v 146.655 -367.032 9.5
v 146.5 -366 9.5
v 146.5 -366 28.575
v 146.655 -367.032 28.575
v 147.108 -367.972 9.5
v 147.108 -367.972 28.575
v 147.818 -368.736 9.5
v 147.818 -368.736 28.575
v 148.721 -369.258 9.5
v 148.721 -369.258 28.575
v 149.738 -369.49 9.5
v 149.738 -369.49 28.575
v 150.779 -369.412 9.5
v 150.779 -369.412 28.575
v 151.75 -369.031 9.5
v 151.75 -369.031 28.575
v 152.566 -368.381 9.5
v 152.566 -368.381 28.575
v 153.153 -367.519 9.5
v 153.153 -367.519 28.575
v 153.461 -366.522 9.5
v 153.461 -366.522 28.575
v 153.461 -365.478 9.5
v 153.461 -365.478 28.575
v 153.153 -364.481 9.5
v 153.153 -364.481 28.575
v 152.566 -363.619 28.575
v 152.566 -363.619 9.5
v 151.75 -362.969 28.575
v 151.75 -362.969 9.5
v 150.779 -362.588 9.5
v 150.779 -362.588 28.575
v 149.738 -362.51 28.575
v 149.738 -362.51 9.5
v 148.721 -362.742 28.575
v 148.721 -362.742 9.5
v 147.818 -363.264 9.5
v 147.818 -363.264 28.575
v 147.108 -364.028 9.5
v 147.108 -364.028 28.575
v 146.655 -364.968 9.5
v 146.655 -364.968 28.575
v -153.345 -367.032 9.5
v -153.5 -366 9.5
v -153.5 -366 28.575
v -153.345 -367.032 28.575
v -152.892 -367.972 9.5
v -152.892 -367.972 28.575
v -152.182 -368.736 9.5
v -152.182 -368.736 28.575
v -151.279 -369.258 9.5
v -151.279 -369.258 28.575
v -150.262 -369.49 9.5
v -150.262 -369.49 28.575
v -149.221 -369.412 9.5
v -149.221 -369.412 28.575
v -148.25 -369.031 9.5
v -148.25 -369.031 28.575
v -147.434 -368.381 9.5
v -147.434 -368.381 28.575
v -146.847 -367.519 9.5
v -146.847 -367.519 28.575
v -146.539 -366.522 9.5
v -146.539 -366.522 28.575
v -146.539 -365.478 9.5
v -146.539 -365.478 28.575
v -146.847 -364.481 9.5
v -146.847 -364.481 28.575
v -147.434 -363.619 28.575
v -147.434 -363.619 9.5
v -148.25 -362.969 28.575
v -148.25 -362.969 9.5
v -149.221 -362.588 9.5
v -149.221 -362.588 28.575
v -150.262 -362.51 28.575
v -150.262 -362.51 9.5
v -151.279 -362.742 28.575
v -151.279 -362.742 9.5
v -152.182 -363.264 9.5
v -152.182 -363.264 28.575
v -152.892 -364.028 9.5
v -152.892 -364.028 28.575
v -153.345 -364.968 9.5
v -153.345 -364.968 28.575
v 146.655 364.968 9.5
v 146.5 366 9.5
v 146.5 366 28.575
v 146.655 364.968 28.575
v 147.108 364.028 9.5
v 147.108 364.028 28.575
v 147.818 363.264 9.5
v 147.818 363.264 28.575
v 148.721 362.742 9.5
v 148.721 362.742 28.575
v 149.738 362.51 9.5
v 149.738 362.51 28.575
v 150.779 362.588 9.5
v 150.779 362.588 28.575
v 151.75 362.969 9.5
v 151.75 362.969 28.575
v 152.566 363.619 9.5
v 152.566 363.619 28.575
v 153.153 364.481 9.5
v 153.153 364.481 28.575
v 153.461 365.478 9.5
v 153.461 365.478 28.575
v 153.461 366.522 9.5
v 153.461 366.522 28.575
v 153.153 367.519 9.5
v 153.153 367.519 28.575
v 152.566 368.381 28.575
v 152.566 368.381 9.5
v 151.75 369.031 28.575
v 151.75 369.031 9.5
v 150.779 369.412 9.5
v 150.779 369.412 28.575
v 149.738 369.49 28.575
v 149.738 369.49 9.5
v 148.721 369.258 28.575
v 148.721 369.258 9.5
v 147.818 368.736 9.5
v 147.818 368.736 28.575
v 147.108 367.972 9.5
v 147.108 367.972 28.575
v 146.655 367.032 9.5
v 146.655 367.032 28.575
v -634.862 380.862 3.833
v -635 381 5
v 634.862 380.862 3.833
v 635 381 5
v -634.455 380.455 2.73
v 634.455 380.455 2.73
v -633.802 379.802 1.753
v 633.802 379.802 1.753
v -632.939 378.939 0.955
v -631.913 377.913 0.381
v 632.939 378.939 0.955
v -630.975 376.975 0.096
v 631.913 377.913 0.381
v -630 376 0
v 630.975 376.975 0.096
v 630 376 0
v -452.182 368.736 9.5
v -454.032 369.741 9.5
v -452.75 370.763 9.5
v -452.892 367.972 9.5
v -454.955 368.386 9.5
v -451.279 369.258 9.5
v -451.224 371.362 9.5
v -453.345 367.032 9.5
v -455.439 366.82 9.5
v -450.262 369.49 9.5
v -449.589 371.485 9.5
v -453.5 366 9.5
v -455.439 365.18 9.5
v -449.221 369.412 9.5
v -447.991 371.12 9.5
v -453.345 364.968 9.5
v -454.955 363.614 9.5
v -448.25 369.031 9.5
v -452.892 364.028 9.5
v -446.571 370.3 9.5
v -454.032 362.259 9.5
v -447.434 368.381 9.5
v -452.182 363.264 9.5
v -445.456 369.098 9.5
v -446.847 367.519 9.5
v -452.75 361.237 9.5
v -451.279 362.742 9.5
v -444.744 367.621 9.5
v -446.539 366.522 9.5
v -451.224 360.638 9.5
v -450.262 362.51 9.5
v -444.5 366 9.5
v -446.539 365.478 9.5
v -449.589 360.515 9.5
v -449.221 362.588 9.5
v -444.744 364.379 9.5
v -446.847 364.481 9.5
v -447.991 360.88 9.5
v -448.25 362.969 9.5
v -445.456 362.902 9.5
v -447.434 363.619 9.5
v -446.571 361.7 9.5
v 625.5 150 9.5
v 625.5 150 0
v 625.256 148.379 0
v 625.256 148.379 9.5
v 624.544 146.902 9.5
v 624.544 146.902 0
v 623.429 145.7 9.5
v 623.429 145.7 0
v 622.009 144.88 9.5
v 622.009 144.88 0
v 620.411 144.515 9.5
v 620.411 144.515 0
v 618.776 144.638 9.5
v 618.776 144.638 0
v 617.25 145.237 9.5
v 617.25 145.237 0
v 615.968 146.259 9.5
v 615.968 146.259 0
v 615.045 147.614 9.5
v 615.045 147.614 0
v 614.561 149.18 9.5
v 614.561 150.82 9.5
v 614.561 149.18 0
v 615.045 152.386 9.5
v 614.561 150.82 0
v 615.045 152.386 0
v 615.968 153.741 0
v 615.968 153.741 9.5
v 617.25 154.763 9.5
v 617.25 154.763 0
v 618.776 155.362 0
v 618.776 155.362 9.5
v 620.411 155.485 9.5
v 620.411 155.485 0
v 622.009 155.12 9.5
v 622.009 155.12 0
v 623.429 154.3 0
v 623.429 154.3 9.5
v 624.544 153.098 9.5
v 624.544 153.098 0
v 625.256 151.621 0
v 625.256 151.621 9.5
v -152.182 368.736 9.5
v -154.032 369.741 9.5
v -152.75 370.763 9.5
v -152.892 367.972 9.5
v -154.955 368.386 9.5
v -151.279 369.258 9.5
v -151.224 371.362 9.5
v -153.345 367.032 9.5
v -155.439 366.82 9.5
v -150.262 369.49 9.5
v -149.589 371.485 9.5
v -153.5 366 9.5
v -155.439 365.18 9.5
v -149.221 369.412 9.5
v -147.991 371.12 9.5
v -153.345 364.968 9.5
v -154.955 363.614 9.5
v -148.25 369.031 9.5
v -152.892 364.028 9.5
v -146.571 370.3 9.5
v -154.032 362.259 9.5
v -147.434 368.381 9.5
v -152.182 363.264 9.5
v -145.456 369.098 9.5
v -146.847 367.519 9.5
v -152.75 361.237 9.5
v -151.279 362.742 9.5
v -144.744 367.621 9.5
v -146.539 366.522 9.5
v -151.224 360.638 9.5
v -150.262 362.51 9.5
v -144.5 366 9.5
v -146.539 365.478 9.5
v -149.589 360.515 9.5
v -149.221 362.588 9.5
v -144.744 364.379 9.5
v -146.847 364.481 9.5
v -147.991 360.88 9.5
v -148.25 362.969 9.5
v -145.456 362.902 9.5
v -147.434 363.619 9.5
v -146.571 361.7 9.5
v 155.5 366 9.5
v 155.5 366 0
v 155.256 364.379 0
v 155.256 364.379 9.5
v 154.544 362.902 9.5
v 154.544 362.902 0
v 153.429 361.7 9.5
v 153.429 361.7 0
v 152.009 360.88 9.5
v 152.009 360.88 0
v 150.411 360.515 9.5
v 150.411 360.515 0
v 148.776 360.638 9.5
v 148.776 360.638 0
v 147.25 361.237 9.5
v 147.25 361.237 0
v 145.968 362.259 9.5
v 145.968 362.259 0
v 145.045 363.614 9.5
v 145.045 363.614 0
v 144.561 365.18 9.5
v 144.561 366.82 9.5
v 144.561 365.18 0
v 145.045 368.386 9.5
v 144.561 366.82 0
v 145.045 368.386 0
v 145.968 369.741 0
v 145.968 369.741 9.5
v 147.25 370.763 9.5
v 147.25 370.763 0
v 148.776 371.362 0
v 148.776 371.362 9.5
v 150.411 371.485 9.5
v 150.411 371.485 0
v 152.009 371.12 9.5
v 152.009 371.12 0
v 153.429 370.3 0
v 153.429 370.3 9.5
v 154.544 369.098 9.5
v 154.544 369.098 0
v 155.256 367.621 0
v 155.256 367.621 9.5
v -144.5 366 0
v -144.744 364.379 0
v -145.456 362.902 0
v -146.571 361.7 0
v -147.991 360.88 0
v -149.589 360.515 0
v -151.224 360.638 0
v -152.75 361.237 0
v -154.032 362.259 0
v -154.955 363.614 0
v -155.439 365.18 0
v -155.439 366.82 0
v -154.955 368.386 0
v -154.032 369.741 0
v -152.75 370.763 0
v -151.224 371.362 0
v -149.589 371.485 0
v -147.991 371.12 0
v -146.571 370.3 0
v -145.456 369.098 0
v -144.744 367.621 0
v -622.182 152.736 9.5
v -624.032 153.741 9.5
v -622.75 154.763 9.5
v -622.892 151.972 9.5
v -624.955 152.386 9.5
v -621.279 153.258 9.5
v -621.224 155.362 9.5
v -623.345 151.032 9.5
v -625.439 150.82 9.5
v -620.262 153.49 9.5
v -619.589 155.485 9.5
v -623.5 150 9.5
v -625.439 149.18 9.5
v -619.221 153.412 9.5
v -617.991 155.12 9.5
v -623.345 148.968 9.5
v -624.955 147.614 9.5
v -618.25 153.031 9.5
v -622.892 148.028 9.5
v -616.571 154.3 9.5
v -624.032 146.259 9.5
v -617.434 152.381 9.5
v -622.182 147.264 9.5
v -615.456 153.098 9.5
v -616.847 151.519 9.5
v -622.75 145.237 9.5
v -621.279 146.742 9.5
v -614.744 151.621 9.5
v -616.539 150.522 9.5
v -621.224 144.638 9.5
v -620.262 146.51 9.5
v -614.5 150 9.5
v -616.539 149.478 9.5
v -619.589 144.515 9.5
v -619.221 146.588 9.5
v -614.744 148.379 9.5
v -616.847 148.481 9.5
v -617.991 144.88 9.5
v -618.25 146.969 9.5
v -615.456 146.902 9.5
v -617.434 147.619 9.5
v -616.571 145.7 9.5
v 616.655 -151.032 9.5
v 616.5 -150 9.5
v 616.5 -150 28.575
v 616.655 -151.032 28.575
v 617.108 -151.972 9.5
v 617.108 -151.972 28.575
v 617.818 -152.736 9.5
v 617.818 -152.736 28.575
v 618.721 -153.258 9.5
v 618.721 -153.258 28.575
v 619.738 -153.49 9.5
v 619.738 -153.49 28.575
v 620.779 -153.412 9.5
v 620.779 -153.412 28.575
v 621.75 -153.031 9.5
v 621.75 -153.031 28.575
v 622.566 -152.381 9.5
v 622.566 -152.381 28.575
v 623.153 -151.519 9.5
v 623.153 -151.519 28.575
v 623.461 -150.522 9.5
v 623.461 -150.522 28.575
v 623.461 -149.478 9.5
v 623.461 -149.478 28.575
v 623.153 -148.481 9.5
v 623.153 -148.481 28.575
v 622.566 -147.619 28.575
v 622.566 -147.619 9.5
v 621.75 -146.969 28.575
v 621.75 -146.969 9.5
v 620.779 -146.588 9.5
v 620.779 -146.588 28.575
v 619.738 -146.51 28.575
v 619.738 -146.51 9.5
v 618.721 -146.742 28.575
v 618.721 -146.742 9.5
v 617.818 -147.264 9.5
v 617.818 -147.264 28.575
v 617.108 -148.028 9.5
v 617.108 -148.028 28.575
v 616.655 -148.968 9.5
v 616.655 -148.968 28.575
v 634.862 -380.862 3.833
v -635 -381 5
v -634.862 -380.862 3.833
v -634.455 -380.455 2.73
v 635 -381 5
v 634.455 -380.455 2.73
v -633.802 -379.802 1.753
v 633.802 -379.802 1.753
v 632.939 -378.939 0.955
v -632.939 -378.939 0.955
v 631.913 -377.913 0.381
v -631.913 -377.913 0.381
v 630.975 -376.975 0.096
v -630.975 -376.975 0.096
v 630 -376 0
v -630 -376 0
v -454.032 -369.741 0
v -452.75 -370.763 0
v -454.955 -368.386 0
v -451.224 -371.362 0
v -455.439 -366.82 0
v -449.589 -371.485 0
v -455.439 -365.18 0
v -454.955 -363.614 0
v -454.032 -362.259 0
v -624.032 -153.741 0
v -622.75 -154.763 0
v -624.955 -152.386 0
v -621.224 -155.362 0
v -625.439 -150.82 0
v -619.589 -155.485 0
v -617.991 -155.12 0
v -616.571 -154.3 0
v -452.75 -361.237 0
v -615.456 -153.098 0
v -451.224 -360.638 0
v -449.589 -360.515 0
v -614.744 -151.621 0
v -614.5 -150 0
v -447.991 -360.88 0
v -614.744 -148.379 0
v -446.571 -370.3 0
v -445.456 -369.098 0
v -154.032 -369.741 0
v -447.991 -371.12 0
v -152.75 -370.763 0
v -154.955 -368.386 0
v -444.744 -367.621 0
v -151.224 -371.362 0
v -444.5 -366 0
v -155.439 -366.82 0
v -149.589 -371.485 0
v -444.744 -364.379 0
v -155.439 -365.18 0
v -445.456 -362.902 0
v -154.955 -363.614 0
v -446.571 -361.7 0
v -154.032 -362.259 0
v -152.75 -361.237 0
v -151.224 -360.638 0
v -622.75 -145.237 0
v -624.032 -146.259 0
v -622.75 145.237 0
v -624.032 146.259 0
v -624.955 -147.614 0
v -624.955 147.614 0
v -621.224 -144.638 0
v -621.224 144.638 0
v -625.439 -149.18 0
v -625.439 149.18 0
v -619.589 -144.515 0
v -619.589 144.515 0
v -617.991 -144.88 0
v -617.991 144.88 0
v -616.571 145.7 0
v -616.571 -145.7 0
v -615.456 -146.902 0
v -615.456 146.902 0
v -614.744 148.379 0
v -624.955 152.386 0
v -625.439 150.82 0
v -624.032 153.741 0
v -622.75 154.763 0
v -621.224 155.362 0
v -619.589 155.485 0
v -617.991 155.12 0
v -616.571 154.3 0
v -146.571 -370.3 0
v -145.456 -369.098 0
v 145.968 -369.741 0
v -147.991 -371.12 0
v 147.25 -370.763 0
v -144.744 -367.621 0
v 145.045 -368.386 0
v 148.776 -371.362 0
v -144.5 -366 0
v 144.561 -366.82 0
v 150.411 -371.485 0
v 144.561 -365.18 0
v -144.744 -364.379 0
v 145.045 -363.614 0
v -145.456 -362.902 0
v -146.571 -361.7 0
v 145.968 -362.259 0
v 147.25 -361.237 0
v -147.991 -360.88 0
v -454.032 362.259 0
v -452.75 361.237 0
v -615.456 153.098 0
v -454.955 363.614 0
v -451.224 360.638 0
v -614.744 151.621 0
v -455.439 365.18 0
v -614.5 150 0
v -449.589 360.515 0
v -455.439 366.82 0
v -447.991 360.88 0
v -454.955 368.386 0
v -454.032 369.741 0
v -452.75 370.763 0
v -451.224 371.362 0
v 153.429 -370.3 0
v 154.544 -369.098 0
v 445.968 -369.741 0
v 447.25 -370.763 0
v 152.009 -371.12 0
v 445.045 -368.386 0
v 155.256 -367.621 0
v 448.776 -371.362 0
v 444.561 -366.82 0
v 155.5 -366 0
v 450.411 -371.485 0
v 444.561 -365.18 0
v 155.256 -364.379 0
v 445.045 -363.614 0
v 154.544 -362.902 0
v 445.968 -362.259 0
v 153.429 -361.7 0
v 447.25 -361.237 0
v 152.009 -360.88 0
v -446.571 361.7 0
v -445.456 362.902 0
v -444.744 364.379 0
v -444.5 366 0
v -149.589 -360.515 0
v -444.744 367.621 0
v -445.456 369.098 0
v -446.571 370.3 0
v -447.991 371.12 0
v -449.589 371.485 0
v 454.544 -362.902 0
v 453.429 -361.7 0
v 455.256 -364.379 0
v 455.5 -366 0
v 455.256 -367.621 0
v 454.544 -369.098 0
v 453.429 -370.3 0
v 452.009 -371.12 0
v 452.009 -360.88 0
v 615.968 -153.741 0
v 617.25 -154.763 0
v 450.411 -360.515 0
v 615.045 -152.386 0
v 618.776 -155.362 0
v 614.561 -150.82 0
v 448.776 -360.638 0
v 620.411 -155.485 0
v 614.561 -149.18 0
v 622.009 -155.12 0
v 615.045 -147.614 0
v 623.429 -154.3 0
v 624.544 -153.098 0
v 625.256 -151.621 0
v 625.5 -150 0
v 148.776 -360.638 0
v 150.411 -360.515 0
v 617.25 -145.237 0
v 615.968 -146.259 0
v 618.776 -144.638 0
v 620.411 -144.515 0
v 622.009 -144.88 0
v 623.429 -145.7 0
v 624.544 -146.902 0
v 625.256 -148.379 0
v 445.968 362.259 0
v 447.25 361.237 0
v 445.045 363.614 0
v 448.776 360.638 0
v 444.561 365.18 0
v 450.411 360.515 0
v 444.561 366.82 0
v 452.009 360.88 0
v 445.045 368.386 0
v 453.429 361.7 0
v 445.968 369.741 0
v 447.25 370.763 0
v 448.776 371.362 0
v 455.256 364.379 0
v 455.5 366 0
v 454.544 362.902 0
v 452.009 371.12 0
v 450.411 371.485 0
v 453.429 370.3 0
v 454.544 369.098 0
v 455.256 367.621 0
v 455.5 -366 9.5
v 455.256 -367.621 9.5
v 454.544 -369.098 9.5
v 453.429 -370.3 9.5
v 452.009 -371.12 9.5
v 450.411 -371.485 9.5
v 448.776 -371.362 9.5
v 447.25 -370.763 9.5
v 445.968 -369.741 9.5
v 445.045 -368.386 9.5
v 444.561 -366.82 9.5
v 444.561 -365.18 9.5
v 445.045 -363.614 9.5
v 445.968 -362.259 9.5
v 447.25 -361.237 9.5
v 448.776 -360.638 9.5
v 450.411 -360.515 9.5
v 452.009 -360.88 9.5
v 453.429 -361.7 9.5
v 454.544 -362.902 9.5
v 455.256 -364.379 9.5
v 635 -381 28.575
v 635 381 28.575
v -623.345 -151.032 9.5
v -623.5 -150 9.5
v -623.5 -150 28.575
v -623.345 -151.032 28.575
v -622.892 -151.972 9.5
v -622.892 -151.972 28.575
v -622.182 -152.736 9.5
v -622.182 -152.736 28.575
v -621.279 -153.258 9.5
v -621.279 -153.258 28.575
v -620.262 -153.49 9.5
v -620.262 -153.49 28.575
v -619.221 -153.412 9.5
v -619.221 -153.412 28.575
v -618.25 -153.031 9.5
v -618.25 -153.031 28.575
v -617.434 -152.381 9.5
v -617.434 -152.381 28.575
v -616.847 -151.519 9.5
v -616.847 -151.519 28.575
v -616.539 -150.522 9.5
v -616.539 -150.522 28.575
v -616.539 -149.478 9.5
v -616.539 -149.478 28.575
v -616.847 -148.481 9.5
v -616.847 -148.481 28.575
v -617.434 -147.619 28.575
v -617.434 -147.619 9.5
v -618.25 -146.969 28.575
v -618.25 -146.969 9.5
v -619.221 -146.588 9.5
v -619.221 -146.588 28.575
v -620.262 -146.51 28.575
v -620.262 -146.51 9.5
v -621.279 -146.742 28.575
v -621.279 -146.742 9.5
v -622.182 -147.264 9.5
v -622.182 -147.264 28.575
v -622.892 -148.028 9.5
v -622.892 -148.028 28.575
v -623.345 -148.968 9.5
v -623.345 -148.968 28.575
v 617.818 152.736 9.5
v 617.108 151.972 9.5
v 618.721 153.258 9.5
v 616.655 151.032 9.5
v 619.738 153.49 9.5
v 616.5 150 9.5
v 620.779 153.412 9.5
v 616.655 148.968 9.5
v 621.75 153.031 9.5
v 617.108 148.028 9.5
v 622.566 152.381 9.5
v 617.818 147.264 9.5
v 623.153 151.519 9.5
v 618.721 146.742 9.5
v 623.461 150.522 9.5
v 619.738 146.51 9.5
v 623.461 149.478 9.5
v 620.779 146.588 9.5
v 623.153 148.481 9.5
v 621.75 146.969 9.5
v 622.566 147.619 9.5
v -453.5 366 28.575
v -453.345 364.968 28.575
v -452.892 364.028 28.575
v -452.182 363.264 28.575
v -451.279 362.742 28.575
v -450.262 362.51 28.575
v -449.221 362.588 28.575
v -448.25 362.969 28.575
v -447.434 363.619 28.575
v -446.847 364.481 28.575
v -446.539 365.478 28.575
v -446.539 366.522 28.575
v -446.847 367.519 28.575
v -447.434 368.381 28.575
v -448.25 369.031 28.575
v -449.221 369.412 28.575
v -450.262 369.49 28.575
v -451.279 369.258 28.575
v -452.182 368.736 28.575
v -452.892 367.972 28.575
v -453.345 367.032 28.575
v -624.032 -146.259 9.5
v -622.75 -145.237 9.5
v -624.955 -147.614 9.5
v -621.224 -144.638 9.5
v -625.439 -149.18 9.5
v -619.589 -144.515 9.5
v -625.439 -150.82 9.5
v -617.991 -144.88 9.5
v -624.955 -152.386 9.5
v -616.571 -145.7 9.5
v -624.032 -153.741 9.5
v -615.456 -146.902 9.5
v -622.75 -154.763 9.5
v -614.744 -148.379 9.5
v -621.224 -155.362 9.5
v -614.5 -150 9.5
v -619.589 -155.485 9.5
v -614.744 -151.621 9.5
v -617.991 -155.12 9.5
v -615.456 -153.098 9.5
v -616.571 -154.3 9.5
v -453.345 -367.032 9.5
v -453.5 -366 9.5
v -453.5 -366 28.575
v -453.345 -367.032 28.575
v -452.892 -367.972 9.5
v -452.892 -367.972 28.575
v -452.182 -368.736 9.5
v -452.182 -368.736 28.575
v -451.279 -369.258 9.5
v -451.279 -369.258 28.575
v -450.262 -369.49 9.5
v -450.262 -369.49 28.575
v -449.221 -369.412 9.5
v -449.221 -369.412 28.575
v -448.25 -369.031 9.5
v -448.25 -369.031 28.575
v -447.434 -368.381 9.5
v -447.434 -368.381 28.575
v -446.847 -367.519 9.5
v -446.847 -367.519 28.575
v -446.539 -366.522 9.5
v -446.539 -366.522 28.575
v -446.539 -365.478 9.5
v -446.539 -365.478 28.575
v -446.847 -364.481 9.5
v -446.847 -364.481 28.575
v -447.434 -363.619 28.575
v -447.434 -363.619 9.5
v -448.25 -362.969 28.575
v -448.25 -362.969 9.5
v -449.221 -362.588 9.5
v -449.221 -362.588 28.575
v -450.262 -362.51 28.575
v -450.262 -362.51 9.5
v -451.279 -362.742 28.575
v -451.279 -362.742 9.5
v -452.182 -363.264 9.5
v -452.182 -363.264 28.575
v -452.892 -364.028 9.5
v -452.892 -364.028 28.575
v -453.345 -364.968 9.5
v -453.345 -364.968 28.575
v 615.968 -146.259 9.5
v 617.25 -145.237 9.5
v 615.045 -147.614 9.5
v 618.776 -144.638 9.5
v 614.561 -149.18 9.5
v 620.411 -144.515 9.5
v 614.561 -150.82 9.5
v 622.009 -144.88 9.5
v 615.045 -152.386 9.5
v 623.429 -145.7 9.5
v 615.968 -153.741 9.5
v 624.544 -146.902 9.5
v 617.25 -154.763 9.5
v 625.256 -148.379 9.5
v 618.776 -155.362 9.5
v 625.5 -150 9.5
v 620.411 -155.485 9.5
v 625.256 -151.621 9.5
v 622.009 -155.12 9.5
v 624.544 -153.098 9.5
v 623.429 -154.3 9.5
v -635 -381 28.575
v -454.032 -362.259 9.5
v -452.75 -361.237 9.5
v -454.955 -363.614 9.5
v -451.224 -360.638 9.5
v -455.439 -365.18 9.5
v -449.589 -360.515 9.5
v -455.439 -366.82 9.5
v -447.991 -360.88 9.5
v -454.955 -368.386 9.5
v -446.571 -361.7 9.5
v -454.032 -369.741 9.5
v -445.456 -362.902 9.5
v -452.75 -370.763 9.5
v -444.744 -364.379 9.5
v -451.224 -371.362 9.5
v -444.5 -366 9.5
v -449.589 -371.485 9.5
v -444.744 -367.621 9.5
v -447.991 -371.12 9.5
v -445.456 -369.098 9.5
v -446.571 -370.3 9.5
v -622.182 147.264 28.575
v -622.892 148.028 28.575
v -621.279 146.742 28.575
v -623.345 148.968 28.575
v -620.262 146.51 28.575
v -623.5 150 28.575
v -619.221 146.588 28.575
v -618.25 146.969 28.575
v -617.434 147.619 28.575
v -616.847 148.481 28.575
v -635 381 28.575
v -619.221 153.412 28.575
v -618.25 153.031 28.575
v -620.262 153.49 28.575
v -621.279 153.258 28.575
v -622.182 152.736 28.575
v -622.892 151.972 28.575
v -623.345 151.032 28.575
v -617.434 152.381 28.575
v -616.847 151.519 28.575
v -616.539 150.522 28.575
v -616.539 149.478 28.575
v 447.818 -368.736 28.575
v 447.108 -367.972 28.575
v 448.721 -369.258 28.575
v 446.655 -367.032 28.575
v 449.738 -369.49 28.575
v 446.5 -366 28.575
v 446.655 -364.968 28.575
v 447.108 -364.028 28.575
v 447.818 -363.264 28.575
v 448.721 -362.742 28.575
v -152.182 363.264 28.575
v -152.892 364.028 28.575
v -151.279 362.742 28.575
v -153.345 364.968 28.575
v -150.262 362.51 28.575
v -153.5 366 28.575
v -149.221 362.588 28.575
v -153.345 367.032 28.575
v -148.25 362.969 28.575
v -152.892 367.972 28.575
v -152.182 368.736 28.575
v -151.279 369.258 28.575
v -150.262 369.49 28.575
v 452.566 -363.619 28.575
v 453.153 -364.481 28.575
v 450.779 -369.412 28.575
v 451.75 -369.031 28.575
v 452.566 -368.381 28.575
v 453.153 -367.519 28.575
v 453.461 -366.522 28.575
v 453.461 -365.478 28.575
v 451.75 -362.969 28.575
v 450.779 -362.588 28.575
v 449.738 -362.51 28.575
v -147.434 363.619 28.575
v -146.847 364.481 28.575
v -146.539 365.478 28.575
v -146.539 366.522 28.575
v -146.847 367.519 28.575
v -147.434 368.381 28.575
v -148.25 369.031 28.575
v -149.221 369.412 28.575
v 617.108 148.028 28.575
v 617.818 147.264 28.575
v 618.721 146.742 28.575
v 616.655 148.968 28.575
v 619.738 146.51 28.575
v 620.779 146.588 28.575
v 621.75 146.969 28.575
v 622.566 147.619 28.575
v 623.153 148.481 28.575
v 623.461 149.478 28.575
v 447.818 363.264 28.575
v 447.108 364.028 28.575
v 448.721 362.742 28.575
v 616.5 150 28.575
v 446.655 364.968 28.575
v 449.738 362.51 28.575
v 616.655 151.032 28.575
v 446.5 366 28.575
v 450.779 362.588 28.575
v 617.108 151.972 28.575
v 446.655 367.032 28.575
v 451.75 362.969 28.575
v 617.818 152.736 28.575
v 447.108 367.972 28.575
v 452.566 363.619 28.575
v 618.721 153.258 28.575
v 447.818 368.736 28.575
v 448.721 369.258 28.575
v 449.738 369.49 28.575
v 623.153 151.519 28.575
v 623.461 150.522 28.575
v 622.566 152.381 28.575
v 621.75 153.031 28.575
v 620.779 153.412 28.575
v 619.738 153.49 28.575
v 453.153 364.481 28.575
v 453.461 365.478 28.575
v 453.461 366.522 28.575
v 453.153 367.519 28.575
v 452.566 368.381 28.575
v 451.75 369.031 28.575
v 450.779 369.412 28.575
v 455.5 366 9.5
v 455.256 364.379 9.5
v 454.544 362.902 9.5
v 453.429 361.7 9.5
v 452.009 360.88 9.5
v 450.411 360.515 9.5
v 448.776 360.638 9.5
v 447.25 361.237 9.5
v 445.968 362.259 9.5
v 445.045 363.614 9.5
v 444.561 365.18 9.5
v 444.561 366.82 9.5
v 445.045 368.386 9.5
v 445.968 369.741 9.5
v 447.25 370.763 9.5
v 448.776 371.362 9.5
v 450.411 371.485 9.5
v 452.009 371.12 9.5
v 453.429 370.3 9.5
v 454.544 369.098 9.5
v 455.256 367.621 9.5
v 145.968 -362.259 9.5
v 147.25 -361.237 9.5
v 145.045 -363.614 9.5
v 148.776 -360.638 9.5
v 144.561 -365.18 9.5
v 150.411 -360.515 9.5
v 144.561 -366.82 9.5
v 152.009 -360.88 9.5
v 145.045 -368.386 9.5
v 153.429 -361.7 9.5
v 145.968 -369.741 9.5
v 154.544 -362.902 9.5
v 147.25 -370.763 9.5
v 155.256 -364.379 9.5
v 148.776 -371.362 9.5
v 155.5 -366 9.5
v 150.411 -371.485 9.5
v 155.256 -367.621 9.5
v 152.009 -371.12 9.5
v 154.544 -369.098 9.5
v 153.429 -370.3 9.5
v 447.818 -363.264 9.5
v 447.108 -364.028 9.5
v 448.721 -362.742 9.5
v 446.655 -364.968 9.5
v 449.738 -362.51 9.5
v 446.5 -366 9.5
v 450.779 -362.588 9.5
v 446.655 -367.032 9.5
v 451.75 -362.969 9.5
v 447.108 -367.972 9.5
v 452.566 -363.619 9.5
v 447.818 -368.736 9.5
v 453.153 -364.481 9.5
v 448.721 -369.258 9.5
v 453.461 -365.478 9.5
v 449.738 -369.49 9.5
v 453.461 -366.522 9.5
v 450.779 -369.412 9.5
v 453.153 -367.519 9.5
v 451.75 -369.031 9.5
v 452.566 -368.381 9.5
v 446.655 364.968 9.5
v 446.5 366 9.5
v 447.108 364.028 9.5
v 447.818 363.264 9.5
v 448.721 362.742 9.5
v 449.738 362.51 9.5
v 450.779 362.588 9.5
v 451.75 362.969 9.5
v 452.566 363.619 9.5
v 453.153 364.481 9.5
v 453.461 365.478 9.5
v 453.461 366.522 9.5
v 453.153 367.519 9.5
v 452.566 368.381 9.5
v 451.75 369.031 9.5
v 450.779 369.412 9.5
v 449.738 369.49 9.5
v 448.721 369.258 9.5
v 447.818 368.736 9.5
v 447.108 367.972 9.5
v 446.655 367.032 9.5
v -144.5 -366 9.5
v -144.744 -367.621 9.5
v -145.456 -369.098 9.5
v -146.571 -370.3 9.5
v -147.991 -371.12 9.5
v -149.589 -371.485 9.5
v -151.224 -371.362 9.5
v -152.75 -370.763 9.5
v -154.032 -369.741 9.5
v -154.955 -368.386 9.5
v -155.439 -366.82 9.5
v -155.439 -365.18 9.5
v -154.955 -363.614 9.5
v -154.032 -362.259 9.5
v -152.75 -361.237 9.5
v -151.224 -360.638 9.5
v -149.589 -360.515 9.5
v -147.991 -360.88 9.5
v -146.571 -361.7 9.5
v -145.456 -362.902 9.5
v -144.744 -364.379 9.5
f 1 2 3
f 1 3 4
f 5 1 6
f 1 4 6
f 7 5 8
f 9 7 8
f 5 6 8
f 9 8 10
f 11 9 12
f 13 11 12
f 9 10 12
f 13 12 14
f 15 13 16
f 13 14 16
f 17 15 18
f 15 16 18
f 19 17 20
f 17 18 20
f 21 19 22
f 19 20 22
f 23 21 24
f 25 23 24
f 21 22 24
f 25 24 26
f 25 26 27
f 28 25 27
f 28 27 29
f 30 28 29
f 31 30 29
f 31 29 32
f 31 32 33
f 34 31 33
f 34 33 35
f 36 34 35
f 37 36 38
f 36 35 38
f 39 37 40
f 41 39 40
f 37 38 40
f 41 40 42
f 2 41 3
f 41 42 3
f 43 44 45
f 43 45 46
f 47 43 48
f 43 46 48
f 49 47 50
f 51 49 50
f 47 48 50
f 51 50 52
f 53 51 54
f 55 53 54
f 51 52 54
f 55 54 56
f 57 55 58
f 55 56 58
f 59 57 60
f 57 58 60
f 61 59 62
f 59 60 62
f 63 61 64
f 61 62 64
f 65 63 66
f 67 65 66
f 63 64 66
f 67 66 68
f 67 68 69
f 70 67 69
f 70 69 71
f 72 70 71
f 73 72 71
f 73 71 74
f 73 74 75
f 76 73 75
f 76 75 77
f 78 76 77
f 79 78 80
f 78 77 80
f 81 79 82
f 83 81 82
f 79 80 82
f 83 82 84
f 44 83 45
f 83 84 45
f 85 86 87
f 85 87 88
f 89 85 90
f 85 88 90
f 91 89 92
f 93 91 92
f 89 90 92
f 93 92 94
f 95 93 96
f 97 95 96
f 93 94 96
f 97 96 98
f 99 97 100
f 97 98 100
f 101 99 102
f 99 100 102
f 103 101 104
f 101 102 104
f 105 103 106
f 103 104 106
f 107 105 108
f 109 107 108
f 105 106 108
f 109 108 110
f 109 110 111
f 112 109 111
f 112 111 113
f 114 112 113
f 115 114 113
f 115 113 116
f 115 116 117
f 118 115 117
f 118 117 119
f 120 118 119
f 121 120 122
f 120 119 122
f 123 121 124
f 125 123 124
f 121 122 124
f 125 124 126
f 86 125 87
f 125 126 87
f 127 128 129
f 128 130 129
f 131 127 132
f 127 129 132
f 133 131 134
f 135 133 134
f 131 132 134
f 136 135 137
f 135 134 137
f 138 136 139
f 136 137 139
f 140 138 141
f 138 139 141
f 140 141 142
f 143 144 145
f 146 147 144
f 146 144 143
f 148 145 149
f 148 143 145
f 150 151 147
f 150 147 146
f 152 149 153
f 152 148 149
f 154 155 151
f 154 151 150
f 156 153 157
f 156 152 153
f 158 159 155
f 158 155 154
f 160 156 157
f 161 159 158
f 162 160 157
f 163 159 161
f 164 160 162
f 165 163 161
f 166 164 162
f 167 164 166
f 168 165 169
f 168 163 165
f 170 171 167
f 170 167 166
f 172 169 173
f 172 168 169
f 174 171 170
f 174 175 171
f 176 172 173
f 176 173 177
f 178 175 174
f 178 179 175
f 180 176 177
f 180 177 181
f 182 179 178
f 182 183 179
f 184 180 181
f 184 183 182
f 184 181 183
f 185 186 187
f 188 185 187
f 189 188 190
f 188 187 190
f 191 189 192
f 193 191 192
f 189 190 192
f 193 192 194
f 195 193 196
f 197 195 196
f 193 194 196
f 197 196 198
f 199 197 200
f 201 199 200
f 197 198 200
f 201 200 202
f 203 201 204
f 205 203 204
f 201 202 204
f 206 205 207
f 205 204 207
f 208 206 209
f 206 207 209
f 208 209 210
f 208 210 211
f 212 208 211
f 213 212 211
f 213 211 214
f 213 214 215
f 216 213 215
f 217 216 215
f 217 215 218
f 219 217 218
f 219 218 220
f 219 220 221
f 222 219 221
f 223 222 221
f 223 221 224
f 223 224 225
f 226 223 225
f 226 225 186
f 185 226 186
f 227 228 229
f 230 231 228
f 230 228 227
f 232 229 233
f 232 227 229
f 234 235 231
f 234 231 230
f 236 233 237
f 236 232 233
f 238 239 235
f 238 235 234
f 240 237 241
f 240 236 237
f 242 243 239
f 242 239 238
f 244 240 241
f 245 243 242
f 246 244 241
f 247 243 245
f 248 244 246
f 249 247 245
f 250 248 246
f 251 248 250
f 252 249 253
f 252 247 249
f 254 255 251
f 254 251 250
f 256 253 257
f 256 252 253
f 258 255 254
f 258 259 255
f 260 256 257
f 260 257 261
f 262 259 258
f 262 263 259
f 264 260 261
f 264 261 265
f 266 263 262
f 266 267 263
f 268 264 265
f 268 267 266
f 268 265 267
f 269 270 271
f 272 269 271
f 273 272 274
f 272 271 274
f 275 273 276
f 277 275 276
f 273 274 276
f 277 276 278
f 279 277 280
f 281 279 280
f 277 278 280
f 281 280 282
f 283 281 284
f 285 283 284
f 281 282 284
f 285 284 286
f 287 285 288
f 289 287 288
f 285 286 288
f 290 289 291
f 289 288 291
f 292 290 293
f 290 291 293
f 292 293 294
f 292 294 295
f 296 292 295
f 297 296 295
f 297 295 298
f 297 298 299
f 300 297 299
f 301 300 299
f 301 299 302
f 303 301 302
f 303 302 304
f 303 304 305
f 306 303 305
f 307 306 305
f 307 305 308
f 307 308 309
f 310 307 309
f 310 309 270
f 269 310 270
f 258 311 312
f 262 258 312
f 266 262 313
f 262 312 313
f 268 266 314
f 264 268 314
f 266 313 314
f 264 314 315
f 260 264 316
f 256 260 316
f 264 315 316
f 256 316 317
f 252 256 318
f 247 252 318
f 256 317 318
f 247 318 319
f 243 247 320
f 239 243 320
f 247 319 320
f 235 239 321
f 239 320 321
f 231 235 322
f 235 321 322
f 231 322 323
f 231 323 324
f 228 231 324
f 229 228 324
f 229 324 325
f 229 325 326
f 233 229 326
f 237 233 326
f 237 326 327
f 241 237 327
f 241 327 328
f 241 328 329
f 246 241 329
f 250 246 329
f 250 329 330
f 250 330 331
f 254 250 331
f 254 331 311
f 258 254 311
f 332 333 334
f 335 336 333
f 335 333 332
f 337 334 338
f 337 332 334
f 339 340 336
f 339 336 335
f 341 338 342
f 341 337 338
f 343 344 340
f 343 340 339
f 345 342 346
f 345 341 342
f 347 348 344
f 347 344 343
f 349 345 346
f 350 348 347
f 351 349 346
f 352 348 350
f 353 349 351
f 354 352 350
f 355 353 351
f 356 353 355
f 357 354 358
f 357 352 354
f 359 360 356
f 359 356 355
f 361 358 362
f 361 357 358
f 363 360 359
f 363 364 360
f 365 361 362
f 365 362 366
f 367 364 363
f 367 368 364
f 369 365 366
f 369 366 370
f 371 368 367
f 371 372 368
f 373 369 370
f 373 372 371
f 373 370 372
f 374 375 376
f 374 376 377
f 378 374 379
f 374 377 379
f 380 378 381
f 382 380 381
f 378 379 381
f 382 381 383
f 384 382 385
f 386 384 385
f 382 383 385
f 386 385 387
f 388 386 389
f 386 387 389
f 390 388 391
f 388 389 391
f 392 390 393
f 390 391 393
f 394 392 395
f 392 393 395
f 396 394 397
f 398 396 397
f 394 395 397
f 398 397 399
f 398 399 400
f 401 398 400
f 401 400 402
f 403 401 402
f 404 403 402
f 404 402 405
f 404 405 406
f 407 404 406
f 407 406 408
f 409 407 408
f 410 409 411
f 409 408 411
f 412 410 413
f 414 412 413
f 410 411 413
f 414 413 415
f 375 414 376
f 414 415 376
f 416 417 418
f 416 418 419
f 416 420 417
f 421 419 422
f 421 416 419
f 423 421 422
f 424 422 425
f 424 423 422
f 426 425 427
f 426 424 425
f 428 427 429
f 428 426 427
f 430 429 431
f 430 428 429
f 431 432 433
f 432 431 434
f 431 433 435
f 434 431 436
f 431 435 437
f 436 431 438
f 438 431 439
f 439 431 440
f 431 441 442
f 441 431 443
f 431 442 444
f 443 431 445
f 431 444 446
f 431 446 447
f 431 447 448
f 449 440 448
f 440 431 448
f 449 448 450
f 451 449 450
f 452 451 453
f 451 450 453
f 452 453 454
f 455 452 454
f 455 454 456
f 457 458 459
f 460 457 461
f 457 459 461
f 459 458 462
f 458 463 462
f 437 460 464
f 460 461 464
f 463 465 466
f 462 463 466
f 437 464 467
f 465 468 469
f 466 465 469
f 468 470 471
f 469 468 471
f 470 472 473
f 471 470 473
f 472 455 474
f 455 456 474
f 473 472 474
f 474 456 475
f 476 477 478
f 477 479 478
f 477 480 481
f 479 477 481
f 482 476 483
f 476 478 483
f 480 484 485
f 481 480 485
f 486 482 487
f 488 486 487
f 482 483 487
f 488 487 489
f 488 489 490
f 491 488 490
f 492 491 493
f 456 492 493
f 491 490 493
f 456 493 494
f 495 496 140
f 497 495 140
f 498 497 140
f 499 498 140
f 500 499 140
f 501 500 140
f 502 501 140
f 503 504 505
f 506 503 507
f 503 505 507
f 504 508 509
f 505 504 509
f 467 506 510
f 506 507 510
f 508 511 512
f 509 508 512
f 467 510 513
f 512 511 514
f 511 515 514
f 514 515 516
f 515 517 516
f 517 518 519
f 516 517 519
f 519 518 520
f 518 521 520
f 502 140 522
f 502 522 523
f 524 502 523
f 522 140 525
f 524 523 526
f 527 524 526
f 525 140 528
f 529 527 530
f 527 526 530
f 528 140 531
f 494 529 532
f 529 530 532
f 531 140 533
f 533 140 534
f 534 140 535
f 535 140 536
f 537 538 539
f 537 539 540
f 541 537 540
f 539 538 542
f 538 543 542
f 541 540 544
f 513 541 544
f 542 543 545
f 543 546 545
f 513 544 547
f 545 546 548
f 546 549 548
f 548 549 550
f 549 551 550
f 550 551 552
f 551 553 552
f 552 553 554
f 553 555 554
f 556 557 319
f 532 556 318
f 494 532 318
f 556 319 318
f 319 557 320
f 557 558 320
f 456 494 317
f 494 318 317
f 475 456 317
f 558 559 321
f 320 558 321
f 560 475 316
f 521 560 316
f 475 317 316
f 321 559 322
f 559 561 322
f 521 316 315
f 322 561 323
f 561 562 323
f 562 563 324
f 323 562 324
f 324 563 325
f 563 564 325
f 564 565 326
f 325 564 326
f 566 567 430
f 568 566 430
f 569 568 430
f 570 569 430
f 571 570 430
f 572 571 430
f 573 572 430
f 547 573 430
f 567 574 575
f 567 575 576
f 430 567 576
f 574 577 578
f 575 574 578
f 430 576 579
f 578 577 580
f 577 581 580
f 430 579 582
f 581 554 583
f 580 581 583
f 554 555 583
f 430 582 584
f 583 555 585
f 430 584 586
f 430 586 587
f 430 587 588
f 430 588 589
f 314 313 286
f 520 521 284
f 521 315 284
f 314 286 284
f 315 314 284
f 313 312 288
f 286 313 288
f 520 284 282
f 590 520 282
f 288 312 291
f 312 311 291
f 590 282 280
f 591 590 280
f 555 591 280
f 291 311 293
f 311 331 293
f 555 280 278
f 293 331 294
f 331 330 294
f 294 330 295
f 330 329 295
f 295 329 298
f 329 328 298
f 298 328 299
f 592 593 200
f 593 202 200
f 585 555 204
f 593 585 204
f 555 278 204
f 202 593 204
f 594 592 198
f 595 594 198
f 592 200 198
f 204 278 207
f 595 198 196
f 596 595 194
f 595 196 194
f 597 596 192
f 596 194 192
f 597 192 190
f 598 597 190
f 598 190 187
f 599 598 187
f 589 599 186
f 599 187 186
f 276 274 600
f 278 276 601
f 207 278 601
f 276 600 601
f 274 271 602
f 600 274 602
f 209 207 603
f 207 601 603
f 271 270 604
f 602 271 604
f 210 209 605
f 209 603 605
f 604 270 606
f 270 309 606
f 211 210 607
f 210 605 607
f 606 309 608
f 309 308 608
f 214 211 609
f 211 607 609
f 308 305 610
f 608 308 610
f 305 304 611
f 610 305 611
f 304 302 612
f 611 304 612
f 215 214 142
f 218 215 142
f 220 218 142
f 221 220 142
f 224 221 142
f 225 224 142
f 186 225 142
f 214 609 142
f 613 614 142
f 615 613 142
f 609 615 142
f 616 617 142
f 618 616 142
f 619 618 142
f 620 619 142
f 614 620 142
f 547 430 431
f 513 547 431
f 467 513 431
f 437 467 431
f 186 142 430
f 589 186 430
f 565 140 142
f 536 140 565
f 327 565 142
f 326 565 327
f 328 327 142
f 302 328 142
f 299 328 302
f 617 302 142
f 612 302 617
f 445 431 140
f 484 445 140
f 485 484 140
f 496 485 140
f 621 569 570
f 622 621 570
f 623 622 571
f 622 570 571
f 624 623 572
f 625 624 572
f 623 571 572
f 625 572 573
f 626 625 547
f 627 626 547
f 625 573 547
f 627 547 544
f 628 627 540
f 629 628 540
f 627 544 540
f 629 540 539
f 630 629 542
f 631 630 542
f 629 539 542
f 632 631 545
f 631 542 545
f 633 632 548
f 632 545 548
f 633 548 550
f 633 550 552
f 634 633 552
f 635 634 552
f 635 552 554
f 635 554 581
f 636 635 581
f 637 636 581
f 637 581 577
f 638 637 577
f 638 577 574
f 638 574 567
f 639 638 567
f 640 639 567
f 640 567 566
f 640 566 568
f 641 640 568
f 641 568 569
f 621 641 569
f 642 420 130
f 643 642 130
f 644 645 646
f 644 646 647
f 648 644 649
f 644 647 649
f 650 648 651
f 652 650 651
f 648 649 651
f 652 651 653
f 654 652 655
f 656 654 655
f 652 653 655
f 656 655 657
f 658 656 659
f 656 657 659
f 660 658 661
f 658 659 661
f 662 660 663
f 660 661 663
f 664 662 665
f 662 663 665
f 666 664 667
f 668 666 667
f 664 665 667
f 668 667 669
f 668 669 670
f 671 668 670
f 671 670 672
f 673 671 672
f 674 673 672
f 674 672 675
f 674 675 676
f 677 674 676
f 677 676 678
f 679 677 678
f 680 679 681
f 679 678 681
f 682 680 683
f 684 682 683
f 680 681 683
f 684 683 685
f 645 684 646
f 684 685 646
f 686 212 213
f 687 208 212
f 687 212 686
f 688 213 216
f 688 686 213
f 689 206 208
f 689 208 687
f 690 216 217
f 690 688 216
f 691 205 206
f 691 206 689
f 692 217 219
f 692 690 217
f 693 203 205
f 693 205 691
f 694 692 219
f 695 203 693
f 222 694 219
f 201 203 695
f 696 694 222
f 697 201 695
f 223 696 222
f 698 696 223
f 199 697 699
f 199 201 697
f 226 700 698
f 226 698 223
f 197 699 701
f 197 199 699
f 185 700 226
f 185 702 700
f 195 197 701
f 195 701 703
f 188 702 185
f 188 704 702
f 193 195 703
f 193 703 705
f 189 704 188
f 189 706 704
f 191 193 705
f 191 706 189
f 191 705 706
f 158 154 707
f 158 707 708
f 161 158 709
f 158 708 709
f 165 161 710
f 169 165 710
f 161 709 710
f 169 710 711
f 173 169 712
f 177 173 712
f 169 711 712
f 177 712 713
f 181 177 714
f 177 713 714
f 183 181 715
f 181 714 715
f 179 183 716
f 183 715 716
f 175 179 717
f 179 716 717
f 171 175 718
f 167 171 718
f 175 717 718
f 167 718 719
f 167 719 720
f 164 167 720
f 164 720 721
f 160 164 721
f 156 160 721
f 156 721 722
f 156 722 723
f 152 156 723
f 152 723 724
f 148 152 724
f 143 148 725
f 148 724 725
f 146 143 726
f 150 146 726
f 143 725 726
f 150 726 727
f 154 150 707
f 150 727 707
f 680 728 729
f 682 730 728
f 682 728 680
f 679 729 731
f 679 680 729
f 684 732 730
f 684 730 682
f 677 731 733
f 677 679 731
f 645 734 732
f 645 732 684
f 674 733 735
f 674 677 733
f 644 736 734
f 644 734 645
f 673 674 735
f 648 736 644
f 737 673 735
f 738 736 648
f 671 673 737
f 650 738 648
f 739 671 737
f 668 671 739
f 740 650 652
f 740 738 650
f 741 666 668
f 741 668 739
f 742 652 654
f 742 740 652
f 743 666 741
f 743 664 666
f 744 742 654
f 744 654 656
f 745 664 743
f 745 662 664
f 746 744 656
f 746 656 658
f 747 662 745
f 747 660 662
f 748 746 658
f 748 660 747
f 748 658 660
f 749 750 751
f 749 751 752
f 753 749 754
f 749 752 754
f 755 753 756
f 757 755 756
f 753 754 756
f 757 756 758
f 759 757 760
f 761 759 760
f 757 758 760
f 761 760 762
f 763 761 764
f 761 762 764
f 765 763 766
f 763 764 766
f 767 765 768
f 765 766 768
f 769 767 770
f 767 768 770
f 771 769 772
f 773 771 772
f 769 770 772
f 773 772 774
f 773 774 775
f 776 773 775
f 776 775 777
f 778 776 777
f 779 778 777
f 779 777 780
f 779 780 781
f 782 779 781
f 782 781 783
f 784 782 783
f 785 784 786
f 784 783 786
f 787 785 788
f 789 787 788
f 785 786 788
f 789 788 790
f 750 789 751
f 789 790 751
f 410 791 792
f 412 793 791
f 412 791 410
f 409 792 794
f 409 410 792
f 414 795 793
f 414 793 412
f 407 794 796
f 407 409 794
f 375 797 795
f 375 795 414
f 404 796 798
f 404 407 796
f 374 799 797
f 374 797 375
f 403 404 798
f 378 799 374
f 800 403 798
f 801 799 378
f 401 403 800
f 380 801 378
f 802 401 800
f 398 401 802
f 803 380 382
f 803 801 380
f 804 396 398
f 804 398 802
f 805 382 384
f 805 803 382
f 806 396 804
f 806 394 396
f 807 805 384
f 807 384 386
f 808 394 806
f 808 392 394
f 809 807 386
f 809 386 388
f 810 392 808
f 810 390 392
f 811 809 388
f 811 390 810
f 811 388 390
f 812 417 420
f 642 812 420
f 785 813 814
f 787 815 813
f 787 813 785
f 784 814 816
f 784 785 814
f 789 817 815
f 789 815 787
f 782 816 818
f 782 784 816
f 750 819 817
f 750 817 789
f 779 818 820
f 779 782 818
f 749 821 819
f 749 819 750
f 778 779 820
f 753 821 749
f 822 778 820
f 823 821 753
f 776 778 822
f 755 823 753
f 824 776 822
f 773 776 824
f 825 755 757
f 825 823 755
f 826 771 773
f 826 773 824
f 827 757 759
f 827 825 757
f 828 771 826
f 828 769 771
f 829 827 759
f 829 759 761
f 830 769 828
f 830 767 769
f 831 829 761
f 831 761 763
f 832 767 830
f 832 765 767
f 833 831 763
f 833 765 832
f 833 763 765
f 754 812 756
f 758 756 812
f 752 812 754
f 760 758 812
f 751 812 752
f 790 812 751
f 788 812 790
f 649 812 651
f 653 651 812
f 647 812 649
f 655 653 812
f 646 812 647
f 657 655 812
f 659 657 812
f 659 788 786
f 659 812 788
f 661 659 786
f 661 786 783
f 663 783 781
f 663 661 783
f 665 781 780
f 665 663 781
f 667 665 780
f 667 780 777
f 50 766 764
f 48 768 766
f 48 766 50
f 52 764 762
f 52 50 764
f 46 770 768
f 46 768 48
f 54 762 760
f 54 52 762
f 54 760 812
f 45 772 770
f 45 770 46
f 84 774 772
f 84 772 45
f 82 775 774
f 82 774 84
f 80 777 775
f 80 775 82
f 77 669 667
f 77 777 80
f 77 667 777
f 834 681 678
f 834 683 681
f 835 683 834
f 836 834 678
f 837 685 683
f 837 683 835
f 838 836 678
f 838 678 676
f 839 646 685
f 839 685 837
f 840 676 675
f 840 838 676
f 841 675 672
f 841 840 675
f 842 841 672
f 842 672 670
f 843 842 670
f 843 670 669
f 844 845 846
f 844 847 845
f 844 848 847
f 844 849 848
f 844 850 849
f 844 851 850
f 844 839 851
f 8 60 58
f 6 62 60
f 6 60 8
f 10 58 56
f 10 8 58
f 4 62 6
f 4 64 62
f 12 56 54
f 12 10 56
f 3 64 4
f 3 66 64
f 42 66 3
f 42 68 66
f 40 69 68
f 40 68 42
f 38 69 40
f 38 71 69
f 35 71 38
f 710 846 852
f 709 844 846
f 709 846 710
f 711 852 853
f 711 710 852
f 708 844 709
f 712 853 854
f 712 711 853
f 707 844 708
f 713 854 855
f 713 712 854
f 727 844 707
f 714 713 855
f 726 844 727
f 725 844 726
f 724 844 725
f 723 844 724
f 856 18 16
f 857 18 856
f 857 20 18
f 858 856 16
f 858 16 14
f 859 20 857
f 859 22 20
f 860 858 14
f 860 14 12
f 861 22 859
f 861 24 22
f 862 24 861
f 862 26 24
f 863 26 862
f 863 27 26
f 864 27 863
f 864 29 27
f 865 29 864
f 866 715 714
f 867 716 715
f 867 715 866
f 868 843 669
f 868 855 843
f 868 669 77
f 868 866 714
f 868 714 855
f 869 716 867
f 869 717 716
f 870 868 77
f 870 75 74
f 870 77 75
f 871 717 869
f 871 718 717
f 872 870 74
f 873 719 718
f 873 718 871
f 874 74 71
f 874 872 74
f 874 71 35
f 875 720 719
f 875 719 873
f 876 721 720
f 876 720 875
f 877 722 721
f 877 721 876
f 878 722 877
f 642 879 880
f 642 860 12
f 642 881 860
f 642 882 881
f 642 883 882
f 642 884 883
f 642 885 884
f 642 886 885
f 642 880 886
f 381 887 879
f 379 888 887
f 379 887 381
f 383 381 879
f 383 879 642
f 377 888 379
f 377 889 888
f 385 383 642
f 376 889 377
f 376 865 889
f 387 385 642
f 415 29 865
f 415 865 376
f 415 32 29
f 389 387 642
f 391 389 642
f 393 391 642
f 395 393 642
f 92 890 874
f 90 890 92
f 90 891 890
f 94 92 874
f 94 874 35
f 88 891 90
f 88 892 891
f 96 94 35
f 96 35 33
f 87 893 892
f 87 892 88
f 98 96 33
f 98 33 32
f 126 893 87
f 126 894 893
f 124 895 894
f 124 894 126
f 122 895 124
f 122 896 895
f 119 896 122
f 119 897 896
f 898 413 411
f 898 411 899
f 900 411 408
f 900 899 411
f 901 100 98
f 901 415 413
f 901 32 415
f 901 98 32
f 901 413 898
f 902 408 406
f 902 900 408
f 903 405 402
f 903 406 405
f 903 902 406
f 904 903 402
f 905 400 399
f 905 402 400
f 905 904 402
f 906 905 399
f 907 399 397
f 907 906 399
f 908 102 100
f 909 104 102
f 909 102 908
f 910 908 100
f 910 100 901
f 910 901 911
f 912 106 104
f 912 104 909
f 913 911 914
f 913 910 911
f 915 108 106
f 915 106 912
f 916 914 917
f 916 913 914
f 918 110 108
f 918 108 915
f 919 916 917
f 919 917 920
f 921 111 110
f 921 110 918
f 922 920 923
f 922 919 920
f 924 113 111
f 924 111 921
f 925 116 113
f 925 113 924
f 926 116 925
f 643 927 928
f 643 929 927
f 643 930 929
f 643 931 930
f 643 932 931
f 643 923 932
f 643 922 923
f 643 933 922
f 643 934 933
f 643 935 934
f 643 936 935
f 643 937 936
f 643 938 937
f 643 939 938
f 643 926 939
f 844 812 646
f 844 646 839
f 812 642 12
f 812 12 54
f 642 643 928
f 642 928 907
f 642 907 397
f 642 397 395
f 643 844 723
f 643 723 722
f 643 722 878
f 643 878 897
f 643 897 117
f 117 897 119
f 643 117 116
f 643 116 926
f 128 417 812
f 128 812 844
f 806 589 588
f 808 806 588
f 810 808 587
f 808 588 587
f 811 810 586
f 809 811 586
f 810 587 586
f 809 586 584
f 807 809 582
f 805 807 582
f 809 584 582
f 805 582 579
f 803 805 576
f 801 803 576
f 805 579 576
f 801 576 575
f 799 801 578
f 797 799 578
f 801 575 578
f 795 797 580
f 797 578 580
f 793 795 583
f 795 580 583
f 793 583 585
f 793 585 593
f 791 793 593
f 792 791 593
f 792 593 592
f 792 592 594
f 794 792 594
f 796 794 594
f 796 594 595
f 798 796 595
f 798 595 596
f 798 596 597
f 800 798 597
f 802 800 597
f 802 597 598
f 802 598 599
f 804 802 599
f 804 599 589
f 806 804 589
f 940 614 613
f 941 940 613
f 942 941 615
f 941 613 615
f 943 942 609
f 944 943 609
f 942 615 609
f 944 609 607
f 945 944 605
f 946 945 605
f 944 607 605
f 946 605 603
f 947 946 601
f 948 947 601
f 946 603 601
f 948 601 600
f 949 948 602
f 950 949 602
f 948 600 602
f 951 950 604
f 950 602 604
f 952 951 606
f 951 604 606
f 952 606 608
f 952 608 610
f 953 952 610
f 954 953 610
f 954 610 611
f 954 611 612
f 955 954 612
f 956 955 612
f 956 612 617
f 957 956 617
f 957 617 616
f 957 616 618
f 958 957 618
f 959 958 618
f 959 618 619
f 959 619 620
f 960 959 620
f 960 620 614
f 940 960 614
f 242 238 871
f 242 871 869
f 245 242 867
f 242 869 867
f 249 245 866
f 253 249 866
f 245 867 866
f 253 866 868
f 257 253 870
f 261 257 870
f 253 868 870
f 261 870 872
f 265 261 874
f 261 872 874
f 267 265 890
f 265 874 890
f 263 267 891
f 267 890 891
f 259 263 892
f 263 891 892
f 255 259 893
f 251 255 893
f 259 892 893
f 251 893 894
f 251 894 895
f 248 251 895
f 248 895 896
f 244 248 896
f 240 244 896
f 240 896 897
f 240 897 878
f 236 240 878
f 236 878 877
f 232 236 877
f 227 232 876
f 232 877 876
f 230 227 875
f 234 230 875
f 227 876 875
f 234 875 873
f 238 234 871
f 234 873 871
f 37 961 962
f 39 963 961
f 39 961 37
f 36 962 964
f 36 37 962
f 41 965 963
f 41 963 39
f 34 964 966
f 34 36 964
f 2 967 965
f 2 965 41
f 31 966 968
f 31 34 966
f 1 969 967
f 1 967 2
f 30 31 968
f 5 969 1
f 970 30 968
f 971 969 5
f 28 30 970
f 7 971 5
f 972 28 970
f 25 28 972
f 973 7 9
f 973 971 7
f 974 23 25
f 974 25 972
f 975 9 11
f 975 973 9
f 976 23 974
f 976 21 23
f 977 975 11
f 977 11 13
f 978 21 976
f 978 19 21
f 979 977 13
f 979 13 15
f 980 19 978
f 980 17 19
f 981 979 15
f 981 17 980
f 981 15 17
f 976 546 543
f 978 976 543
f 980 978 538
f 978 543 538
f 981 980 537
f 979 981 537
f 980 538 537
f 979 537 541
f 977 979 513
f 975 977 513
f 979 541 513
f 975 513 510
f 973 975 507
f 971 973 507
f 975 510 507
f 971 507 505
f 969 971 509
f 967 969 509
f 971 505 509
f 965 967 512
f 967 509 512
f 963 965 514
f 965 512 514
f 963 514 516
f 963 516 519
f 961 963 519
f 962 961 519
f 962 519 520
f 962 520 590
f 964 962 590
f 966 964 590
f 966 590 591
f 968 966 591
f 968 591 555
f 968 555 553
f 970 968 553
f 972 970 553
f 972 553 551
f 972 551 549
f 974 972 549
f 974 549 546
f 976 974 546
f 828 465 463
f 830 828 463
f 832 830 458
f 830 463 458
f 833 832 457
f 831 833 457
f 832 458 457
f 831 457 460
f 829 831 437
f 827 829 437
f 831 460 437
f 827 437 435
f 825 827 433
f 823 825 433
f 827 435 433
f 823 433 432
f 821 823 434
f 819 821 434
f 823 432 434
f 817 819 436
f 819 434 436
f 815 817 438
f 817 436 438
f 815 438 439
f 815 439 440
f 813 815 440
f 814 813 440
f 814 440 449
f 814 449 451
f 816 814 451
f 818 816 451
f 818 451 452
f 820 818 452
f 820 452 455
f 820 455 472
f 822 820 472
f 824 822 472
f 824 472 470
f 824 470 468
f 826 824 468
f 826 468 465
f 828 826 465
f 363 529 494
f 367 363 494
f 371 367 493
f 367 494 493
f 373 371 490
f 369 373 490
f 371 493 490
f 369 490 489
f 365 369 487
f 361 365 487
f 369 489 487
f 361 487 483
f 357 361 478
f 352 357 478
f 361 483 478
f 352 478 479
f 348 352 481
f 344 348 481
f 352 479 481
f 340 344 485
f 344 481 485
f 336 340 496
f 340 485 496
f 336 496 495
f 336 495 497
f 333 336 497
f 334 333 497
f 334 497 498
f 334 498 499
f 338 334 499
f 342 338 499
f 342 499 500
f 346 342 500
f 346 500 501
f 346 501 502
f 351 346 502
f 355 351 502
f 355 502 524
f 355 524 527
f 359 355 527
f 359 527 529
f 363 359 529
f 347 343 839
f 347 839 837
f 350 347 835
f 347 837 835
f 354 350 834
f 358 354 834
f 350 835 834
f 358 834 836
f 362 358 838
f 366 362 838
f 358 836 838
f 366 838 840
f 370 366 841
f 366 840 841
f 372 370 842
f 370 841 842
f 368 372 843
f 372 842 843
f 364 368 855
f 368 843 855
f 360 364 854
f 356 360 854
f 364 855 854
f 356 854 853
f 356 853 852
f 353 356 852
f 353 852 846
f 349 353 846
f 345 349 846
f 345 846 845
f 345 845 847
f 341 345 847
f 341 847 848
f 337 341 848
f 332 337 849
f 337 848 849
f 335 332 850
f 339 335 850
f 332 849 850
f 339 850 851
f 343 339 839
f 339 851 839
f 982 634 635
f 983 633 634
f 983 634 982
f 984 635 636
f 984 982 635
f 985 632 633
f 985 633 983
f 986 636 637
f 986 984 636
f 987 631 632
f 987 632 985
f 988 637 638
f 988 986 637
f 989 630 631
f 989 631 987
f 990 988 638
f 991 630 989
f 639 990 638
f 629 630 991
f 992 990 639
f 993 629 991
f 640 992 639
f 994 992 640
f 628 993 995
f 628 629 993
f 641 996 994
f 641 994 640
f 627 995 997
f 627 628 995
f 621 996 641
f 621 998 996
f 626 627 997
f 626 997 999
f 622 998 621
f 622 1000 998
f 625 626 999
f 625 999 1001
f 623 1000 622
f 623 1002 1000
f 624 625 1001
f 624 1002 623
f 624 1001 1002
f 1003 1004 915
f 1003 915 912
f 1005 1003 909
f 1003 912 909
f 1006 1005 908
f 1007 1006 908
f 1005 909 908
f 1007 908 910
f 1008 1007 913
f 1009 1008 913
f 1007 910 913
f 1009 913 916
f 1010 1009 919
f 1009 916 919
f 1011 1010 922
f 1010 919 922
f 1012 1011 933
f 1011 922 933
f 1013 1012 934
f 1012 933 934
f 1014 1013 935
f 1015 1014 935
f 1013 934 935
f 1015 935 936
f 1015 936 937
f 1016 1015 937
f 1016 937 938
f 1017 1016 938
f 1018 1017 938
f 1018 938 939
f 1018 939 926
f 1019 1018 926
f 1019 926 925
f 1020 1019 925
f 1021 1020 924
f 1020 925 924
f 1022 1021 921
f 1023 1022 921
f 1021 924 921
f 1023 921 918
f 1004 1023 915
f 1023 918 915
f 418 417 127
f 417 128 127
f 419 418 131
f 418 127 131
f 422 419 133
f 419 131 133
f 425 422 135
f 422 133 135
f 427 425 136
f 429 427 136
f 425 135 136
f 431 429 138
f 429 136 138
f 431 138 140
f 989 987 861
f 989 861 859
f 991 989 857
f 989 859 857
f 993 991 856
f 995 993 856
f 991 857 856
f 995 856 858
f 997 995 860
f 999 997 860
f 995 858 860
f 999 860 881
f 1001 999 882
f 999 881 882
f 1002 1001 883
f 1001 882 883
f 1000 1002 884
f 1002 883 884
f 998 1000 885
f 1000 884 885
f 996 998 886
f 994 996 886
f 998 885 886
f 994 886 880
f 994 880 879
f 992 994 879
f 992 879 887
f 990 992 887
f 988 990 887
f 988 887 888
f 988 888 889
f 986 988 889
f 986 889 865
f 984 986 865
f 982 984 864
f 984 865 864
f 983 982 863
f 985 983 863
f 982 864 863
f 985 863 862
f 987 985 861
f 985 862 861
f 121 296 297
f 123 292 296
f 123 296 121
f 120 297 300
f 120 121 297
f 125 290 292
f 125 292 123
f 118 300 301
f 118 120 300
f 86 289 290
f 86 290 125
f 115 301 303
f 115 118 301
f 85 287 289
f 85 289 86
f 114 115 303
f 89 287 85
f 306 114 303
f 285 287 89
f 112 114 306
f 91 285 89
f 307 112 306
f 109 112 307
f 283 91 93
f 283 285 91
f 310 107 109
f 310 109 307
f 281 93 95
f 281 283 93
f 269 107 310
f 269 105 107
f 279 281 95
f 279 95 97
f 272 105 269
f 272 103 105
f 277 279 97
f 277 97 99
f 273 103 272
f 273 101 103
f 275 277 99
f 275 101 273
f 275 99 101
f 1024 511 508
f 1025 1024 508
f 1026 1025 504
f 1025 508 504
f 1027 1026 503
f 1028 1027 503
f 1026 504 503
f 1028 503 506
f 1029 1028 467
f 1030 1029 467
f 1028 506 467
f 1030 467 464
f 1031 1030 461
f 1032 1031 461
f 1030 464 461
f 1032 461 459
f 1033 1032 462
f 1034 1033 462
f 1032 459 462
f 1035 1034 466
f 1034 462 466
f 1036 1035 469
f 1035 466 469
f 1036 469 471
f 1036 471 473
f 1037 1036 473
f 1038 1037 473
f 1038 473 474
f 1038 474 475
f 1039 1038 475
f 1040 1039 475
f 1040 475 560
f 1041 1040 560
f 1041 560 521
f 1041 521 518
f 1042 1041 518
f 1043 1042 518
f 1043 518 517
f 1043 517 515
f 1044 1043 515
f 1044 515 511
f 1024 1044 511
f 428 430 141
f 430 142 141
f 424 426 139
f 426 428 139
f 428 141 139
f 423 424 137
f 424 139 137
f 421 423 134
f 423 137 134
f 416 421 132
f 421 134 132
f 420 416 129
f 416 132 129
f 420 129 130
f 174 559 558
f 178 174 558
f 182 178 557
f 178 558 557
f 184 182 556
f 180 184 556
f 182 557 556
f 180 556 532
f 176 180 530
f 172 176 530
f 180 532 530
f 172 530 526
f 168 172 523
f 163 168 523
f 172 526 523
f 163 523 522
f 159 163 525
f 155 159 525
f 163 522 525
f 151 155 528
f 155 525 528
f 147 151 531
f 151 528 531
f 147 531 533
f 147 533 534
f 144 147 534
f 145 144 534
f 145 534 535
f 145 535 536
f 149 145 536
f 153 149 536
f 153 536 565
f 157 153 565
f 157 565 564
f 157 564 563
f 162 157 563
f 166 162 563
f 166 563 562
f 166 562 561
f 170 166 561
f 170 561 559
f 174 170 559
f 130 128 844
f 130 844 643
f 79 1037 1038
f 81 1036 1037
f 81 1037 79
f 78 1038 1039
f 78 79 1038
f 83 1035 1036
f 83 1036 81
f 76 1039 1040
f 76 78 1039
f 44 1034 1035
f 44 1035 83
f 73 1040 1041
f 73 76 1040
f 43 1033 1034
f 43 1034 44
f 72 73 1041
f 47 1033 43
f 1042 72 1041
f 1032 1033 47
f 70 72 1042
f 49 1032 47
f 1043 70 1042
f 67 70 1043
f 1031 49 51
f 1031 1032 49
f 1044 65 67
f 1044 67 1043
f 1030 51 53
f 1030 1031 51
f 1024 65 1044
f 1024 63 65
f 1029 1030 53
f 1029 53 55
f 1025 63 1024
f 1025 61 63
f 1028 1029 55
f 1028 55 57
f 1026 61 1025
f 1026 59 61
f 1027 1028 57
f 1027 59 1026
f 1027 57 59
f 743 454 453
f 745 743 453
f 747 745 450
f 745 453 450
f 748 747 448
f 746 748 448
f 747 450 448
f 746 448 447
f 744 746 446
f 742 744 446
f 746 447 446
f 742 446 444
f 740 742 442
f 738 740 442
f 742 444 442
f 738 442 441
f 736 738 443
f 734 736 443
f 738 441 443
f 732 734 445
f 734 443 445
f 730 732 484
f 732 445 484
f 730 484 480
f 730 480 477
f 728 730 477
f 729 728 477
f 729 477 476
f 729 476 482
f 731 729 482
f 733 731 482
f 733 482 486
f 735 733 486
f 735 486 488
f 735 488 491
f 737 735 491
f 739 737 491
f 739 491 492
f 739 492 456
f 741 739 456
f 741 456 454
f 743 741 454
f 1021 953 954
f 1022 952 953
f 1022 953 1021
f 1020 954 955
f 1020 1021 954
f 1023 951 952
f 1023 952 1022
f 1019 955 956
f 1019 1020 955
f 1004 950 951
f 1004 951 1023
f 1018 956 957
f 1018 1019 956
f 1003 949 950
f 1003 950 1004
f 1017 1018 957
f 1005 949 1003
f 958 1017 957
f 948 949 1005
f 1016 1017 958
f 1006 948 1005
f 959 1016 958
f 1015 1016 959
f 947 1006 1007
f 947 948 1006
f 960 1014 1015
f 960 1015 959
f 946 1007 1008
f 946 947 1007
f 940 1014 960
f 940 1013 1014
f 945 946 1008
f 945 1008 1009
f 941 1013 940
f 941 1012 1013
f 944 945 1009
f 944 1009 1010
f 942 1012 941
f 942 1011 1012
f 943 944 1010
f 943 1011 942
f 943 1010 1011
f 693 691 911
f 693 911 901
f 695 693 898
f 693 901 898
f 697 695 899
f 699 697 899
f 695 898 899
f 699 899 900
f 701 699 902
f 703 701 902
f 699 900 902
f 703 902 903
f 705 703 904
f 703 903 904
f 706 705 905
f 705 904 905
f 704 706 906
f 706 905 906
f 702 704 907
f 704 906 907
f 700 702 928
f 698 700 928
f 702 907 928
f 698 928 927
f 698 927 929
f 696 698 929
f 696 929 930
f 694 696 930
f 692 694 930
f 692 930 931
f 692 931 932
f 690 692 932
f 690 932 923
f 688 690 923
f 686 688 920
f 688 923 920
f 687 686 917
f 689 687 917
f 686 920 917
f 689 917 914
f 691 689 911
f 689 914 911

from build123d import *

# Parameters (mm, degrees)
SKETCH1_W                      = 1270
SKETCH1_H                      = 762
BOSS_EXTRUDE1_DEPTH            = 28.575
CBORE_FOR_M6_SHCS1_D           = 7
CBORE_FOR_M6_SHCS1_CBORE_D     = 11
CBORE_FOR_M6_SHCS1_CBORE_DEPTH = 9.5
FILLET1_R                      = 5


with BuildPart() as part:
    # Sketch1 → Boss-Extrude1 (new body)
    with BuildSketch(Plane.XY):
        Rectangle(SKETCH1_W, SKETCH1_H)
    extrude(amount=BOSS_EXTRUDE1_DEPTH)

    # CBORE for M6 SHCS1 (through all)
    with Locations(Plane(origin=(0, 0, 0), x_dir=(1, 0, 0), z_dir=(0, 0, -1))):
        with Locations((-150, -366), (150, -366), (620, -150), (620, 150), (150, 366), (-150, 366), (-620, 150), (-620, -150), (-450, -366), (450, -366), (450, 366), (-450, 366)):
            CounterBoreHole(CBORE_FOR_M6_SHCS1_D / 2, CBORE_FOR_M6_SHCS1_CBORE_D / 2, CBORE_FOR_M6_SHCS1_CBORE_DEPTH)

    # Fillet1
    fillet1_edges = [part.edges().sort_by_distance(p)[0] for p in [
        (0, -381, 0),
        (-635, 0, 0),
        (0, 381, 0),
        (635, 0, 0),
    ]]
    fillet(fillet1_edges, radius=FILLET1_R)


solid = part.part
